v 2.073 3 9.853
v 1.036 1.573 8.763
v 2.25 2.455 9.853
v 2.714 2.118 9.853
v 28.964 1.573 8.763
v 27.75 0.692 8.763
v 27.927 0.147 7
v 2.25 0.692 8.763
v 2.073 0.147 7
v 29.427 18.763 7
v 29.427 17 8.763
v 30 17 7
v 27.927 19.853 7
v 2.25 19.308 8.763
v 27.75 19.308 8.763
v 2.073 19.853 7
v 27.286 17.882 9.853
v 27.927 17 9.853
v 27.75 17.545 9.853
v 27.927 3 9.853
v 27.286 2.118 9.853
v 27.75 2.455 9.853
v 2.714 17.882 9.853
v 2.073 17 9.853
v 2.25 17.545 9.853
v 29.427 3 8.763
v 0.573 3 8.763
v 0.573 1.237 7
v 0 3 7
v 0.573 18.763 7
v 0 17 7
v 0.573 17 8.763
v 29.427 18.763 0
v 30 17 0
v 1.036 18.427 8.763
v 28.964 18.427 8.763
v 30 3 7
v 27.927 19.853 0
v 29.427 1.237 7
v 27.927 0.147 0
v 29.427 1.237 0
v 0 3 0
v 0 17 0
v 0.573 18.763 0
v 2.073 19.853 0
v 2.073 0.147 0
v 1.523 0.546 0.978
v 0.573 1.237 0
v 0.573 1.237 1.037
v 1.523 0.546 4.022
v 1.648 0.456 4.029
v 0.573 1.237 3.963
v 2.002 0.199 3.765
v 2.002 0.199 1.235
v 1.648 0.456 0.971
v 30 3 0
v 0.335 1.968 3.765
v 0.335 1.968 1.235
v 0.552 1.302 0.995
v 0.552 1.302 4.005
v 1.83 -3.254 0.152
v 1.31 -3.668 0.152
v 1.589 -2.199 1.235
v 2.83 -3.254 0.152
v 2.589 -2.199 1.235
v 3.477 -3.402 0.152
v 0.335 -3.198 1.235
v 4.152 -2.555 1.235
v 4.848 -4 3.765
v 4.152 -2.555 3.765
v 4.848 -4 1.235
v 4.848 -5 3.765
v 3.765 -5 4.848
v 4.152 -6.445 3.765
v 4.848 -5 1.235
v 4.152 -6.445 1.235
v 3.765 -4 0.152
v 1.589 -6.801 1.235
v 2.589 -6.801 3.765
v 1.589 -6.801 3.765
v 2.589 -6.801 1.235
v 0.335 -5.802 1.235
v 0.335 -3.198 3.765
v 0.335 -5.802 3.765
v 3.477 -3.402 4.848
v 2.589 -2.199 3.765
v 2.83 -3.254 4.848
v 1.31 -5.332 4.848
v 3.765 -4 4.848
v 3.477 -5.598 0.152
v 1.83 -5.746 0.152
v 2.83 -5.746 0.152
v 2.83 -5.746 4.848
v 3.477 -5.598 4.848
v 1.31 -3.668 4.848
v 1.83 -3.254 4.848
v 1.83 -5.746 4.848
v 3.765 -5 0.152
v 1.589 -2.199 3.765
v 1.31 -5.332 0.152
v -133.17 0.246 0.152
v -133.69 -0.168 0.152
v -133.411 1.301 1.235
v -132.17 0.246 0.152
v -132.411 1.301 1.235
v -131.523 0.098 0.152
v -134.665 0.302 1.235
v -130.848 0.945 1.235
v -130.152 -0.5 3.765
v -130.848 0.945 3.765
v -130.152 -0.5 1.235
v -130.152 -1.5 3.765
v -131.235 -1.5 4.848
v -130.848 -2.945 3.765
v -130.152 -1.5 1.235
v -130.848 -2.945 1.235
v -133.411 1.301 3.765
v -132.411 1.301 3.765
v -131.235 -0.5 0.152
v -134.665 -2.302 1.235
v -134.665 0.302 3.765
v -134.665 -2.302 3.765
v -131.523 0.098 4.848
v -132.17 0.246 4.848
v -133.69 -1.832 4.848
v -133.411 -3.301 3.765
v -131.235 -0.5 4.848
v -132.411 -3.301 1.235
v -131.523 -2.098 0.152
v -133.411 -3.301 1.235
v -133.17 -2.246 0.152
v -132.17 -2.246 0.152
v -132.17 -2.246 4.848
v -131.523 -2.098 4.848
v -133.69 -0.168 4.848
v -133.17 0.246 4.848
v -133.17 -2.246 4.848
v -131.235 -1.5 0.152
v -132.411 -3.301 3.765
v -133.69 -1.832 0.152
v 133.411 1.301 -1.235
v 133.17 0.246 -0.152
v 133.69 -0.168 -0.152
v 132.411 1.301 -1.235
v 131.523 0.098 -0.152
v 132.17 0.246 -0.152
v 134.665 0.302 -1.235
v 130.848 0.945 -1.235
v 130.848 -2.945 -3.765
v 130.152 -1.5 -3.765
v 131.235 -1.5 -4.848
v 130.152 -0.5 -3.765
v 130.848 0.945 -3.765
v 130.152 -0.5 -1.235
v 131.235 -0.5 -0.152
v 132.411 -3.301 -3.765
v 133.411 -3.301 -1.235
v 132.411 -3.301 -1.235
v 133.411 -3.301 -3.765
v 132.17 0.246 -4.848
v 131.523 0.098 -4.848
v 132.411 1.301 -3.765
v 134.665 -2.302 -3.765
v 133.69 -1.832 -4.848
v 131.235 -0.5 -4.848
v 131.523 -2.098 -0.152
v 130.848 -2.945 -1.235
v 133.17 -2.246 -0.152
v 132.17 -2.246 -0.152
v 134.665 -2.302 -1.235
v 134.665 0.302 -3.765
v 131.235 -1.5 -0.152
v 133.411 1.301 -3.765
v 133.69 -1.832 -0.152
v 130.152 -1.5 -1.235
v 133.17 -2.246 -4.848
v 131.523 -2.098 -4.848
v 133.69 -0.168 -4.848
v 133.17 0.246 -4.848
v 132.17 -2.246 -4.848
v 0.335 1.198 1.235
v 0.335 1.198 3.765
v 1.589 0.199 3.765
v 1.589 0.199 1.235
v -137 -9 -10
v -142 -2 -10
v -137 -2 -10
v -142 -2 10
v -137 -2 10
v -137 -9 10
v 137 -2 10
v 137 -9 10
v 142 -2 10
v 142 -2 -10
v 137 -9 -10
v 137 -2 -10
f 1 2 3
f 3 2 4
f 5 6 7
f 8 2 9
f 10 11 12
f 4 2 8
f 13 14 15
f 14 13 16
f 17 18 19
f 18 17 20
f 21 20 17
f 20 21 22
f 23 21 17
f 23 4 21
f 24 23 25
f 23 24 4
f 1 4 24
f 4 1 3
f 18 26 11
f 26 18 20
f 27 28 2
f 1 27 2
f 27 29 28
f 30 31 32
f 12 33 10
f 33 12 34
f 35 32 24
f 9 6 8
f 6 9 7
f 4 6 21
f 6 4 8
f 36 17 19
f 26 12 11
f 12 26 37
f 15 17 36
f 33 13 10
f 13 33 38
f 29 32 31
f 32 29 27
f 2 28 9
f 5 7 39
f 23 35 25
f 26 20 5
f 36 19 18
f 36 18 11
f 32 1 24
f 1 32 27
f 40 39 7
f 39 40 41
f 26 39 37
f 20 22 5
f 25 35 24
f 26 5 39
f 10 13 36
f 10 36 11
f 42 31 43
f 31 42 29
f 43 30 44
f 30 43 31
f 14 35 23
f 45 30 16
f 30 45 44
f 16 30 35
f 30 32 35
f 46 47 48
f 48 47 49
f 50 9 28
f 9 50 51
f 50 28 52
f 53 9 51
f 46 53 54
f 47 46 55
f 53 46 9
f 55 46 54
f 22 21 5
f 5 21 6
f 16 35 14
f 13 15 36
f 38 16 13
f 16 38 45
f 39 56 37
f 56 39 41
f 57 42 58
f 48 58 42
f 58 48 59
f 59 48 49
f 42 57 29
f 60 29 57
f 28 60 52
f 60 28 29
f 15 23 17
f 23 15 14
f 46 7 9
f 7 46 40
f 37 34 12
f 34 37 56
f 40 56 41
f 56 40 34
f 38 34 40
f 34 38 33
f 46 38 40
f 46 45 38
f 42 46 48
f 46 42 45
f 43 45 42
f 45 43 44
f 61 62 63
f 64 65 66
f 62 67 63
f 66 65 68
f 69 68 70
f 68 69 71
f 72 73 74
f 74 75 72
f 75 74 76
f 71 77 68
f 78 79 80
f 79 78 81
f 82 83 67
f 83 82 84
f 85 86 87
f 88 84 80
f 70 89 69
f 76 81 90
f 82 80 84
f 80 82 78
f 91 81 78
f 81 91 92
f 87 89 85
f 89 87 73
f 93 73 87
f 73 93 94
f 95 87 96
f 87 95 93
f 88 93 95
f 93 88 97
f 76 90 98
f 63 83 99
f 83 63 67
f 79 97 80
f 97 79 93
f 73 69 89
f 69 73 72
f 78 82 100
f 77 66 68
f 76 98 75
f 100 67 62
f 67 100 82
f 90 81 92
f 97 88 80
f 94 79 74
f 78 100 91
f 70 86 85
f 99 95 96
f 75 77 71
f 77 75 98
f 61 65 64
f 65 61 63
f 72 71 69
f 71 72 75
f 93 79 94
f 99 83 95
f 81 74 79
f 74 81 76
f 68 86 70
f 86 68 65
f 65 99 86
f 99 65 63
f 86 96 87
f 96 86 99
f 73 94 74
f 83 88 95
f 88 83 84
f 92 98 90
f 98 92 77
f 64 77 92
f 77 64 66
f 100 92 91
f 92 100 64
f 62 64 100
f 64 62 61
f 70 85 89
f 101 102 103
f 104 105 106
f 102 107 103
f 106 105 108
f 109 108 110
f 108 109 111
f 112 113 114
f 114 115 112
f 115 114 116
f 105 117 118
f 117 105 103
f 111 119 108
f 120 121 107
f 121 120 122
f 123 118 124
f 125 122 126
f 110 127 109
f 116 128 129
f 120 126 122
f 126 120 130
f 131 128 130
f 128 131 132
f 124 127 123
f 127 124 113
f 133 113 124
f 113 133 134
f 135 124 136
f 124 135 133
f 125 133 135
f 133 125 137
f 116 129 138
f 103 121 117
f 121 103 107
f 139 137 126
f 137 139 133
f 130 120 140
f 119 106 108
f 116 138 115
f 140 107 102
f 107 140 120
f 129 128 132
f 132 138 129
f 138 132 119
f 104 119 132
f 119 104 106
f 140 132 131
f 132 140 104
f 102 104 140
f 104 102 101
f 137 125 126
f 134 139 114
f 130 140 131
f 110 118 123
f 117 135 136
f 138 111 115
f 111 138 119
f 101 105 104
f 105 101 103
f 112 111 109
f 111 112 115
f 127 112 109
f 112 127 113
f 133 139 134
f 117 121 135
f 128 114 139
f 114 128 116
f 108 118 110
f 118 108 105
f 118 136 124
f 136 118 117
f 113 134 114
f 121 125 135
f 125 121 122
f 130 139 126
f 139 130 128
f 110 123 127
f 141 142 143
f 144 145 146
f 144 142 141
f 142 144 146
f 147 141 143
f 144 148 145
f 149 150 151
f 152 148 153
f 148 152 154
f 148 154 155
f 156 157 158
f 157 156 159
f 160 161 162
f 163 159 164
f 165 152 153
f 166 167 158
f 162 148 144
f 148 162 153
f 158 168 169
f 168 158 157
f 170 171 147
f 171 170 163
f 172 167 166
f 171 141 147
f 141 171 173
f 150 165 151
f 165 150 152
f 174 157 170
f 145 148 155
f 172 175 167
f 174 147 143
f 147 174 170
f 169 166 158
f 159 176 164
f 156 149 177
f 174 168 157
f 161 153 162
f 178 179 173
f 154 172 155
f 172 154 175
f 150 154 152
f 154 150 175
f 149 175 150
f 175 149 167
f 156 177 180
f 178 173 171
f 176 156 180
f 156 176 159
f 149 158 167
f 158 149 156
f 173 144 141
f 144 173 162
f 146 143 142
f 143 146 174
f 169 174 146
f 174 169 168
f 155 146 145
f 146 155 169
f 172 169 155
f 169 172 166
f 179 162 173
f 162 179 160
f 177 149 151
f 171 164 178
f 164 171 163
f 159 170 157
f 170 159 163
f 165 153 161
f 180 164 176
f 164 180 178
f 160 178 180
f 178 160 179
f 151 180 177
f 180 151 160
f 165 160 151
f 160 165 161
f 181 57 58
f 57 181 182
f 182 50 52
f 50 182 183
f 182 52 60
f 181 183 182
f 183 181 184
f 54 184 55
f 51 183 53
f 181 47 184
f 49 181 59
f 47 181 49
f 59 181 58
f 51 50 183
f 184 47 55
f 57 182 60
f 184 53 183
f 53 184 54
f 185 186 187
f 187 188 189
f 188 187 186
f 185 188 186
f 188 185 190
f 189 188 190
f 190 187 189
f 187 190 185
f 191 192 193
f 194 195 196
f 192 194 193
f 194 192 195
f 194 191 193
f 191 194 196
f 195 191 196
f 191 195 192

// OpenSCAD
include <BOSL/constants.scad>
use <BOSL/metric_screws.scad>
use <BOSL/transforms.scad>
include <OpenSCAD-common-libraries/screw_matrics.scad>
include <OpenSCAD-common-libraries/roundedCube.scad>
use <OpenSCAD-common-libraries/triangles.scad>

base_x_length=308; // Sovol. 
base_y_length=4; // Thickness. 
base_z_length=20; // 20 rail size.

screw_tab_x_length=12; // at each end. 
holder_triangle_enforcer_x_length=5;
holder_x_length=base_x_length-(screw_tab_x_length*2)-(holder_triangle_enforcer_x_length*2);
holder_hole_y_size=3; // 1.75 filament.
holer_y_edge_size=4; // Make it strong enough to sustain spool tangle filament drag force. 
holder_y_length=holder_hole_y_size+holer_y_edge_size;
holder_z_length=base_z_length; 
rounded_corner_radius=holer_y_edge_size/2;

module mount_screw() {
    fwd(2.0)
        xrot(90)
            screw(m3_screw_hole_diameter,
               screwlen=m3_screw_stem_length,
               headsize=m3_screw_head_diameter,
               headlen=3, countersunk=false, align="base");
}

module holder_side(holder_side_y_length) {
        fwd(holder_side_y_length/2)
            roundedCube([holer_y_edge_size, holder_side_y_length, holder_z_length], center=true, r=rounded_corner_radius,
                z=false,
                y=true,
                ycorners=[false, true, true, false]);
}

module holder_triangle_support(holder_side_y_length) {
        zrot(180)
        down(holder_z_length/2)
            back(base_y_length/2)
                triangle(holder_side_y_length, holder_triangle_enforcer_x_length, holder_z_length, center=false);
}

module filament_holder() {
    difference() {
        union() {
            holder_side_y_length=holer_y_edge_size+holder_hole_y_size;
            roundedCube([base_x_length, base_y_length, base_z_length], center=true, r=rounded_corner_radius,
                z=false,
                y=false,
                x=true,
                xcorners=[false, false, true, true]);
            
            up(base_z_length/2-holder_z_length/2) {
                fwd(base_y_length+holder_hole_y_size)
                    roundedCube([holder_x_length, holer_y_edge_size, holder_z_length], center=true, r=rounded_corner_radius,
                        z=false,
                        x=true,
                        xcorners=[true, true, false, false]);
                
                
                side_x_offset=base_x_length/2 - screw_tab_x_length - holer_y_edge_size/2 - holder_triangle_enforcer_x_length;
                left(side_x_offset)
                    holder_side(holder_side_y_length);
                
                right(side_x_offset)
                    yrot(180) // Make the rounded corner toward inner hole.
                        holder_side(holder_side_y_length);
            }
            
            side_x_offset=base_x_length/2 - screw_tab_x_length - holder_triangle_enforcer_x_length;
            left(side_x_offset)
                holder_triangle_support(holder_side_y_length);
            right(side_x_offset)
                yrot(180)
                    holder_triangle_support(holder_side_y_length);
        }
        
        screw_mount_x_offset=base_x_length/2-screw_tab_x_length/2;
        left(screw_mount_x_offset)
            mount_screw();
        right(screw_mount_x_offset)
            mount_screw();
    }
}

filament_holder();
